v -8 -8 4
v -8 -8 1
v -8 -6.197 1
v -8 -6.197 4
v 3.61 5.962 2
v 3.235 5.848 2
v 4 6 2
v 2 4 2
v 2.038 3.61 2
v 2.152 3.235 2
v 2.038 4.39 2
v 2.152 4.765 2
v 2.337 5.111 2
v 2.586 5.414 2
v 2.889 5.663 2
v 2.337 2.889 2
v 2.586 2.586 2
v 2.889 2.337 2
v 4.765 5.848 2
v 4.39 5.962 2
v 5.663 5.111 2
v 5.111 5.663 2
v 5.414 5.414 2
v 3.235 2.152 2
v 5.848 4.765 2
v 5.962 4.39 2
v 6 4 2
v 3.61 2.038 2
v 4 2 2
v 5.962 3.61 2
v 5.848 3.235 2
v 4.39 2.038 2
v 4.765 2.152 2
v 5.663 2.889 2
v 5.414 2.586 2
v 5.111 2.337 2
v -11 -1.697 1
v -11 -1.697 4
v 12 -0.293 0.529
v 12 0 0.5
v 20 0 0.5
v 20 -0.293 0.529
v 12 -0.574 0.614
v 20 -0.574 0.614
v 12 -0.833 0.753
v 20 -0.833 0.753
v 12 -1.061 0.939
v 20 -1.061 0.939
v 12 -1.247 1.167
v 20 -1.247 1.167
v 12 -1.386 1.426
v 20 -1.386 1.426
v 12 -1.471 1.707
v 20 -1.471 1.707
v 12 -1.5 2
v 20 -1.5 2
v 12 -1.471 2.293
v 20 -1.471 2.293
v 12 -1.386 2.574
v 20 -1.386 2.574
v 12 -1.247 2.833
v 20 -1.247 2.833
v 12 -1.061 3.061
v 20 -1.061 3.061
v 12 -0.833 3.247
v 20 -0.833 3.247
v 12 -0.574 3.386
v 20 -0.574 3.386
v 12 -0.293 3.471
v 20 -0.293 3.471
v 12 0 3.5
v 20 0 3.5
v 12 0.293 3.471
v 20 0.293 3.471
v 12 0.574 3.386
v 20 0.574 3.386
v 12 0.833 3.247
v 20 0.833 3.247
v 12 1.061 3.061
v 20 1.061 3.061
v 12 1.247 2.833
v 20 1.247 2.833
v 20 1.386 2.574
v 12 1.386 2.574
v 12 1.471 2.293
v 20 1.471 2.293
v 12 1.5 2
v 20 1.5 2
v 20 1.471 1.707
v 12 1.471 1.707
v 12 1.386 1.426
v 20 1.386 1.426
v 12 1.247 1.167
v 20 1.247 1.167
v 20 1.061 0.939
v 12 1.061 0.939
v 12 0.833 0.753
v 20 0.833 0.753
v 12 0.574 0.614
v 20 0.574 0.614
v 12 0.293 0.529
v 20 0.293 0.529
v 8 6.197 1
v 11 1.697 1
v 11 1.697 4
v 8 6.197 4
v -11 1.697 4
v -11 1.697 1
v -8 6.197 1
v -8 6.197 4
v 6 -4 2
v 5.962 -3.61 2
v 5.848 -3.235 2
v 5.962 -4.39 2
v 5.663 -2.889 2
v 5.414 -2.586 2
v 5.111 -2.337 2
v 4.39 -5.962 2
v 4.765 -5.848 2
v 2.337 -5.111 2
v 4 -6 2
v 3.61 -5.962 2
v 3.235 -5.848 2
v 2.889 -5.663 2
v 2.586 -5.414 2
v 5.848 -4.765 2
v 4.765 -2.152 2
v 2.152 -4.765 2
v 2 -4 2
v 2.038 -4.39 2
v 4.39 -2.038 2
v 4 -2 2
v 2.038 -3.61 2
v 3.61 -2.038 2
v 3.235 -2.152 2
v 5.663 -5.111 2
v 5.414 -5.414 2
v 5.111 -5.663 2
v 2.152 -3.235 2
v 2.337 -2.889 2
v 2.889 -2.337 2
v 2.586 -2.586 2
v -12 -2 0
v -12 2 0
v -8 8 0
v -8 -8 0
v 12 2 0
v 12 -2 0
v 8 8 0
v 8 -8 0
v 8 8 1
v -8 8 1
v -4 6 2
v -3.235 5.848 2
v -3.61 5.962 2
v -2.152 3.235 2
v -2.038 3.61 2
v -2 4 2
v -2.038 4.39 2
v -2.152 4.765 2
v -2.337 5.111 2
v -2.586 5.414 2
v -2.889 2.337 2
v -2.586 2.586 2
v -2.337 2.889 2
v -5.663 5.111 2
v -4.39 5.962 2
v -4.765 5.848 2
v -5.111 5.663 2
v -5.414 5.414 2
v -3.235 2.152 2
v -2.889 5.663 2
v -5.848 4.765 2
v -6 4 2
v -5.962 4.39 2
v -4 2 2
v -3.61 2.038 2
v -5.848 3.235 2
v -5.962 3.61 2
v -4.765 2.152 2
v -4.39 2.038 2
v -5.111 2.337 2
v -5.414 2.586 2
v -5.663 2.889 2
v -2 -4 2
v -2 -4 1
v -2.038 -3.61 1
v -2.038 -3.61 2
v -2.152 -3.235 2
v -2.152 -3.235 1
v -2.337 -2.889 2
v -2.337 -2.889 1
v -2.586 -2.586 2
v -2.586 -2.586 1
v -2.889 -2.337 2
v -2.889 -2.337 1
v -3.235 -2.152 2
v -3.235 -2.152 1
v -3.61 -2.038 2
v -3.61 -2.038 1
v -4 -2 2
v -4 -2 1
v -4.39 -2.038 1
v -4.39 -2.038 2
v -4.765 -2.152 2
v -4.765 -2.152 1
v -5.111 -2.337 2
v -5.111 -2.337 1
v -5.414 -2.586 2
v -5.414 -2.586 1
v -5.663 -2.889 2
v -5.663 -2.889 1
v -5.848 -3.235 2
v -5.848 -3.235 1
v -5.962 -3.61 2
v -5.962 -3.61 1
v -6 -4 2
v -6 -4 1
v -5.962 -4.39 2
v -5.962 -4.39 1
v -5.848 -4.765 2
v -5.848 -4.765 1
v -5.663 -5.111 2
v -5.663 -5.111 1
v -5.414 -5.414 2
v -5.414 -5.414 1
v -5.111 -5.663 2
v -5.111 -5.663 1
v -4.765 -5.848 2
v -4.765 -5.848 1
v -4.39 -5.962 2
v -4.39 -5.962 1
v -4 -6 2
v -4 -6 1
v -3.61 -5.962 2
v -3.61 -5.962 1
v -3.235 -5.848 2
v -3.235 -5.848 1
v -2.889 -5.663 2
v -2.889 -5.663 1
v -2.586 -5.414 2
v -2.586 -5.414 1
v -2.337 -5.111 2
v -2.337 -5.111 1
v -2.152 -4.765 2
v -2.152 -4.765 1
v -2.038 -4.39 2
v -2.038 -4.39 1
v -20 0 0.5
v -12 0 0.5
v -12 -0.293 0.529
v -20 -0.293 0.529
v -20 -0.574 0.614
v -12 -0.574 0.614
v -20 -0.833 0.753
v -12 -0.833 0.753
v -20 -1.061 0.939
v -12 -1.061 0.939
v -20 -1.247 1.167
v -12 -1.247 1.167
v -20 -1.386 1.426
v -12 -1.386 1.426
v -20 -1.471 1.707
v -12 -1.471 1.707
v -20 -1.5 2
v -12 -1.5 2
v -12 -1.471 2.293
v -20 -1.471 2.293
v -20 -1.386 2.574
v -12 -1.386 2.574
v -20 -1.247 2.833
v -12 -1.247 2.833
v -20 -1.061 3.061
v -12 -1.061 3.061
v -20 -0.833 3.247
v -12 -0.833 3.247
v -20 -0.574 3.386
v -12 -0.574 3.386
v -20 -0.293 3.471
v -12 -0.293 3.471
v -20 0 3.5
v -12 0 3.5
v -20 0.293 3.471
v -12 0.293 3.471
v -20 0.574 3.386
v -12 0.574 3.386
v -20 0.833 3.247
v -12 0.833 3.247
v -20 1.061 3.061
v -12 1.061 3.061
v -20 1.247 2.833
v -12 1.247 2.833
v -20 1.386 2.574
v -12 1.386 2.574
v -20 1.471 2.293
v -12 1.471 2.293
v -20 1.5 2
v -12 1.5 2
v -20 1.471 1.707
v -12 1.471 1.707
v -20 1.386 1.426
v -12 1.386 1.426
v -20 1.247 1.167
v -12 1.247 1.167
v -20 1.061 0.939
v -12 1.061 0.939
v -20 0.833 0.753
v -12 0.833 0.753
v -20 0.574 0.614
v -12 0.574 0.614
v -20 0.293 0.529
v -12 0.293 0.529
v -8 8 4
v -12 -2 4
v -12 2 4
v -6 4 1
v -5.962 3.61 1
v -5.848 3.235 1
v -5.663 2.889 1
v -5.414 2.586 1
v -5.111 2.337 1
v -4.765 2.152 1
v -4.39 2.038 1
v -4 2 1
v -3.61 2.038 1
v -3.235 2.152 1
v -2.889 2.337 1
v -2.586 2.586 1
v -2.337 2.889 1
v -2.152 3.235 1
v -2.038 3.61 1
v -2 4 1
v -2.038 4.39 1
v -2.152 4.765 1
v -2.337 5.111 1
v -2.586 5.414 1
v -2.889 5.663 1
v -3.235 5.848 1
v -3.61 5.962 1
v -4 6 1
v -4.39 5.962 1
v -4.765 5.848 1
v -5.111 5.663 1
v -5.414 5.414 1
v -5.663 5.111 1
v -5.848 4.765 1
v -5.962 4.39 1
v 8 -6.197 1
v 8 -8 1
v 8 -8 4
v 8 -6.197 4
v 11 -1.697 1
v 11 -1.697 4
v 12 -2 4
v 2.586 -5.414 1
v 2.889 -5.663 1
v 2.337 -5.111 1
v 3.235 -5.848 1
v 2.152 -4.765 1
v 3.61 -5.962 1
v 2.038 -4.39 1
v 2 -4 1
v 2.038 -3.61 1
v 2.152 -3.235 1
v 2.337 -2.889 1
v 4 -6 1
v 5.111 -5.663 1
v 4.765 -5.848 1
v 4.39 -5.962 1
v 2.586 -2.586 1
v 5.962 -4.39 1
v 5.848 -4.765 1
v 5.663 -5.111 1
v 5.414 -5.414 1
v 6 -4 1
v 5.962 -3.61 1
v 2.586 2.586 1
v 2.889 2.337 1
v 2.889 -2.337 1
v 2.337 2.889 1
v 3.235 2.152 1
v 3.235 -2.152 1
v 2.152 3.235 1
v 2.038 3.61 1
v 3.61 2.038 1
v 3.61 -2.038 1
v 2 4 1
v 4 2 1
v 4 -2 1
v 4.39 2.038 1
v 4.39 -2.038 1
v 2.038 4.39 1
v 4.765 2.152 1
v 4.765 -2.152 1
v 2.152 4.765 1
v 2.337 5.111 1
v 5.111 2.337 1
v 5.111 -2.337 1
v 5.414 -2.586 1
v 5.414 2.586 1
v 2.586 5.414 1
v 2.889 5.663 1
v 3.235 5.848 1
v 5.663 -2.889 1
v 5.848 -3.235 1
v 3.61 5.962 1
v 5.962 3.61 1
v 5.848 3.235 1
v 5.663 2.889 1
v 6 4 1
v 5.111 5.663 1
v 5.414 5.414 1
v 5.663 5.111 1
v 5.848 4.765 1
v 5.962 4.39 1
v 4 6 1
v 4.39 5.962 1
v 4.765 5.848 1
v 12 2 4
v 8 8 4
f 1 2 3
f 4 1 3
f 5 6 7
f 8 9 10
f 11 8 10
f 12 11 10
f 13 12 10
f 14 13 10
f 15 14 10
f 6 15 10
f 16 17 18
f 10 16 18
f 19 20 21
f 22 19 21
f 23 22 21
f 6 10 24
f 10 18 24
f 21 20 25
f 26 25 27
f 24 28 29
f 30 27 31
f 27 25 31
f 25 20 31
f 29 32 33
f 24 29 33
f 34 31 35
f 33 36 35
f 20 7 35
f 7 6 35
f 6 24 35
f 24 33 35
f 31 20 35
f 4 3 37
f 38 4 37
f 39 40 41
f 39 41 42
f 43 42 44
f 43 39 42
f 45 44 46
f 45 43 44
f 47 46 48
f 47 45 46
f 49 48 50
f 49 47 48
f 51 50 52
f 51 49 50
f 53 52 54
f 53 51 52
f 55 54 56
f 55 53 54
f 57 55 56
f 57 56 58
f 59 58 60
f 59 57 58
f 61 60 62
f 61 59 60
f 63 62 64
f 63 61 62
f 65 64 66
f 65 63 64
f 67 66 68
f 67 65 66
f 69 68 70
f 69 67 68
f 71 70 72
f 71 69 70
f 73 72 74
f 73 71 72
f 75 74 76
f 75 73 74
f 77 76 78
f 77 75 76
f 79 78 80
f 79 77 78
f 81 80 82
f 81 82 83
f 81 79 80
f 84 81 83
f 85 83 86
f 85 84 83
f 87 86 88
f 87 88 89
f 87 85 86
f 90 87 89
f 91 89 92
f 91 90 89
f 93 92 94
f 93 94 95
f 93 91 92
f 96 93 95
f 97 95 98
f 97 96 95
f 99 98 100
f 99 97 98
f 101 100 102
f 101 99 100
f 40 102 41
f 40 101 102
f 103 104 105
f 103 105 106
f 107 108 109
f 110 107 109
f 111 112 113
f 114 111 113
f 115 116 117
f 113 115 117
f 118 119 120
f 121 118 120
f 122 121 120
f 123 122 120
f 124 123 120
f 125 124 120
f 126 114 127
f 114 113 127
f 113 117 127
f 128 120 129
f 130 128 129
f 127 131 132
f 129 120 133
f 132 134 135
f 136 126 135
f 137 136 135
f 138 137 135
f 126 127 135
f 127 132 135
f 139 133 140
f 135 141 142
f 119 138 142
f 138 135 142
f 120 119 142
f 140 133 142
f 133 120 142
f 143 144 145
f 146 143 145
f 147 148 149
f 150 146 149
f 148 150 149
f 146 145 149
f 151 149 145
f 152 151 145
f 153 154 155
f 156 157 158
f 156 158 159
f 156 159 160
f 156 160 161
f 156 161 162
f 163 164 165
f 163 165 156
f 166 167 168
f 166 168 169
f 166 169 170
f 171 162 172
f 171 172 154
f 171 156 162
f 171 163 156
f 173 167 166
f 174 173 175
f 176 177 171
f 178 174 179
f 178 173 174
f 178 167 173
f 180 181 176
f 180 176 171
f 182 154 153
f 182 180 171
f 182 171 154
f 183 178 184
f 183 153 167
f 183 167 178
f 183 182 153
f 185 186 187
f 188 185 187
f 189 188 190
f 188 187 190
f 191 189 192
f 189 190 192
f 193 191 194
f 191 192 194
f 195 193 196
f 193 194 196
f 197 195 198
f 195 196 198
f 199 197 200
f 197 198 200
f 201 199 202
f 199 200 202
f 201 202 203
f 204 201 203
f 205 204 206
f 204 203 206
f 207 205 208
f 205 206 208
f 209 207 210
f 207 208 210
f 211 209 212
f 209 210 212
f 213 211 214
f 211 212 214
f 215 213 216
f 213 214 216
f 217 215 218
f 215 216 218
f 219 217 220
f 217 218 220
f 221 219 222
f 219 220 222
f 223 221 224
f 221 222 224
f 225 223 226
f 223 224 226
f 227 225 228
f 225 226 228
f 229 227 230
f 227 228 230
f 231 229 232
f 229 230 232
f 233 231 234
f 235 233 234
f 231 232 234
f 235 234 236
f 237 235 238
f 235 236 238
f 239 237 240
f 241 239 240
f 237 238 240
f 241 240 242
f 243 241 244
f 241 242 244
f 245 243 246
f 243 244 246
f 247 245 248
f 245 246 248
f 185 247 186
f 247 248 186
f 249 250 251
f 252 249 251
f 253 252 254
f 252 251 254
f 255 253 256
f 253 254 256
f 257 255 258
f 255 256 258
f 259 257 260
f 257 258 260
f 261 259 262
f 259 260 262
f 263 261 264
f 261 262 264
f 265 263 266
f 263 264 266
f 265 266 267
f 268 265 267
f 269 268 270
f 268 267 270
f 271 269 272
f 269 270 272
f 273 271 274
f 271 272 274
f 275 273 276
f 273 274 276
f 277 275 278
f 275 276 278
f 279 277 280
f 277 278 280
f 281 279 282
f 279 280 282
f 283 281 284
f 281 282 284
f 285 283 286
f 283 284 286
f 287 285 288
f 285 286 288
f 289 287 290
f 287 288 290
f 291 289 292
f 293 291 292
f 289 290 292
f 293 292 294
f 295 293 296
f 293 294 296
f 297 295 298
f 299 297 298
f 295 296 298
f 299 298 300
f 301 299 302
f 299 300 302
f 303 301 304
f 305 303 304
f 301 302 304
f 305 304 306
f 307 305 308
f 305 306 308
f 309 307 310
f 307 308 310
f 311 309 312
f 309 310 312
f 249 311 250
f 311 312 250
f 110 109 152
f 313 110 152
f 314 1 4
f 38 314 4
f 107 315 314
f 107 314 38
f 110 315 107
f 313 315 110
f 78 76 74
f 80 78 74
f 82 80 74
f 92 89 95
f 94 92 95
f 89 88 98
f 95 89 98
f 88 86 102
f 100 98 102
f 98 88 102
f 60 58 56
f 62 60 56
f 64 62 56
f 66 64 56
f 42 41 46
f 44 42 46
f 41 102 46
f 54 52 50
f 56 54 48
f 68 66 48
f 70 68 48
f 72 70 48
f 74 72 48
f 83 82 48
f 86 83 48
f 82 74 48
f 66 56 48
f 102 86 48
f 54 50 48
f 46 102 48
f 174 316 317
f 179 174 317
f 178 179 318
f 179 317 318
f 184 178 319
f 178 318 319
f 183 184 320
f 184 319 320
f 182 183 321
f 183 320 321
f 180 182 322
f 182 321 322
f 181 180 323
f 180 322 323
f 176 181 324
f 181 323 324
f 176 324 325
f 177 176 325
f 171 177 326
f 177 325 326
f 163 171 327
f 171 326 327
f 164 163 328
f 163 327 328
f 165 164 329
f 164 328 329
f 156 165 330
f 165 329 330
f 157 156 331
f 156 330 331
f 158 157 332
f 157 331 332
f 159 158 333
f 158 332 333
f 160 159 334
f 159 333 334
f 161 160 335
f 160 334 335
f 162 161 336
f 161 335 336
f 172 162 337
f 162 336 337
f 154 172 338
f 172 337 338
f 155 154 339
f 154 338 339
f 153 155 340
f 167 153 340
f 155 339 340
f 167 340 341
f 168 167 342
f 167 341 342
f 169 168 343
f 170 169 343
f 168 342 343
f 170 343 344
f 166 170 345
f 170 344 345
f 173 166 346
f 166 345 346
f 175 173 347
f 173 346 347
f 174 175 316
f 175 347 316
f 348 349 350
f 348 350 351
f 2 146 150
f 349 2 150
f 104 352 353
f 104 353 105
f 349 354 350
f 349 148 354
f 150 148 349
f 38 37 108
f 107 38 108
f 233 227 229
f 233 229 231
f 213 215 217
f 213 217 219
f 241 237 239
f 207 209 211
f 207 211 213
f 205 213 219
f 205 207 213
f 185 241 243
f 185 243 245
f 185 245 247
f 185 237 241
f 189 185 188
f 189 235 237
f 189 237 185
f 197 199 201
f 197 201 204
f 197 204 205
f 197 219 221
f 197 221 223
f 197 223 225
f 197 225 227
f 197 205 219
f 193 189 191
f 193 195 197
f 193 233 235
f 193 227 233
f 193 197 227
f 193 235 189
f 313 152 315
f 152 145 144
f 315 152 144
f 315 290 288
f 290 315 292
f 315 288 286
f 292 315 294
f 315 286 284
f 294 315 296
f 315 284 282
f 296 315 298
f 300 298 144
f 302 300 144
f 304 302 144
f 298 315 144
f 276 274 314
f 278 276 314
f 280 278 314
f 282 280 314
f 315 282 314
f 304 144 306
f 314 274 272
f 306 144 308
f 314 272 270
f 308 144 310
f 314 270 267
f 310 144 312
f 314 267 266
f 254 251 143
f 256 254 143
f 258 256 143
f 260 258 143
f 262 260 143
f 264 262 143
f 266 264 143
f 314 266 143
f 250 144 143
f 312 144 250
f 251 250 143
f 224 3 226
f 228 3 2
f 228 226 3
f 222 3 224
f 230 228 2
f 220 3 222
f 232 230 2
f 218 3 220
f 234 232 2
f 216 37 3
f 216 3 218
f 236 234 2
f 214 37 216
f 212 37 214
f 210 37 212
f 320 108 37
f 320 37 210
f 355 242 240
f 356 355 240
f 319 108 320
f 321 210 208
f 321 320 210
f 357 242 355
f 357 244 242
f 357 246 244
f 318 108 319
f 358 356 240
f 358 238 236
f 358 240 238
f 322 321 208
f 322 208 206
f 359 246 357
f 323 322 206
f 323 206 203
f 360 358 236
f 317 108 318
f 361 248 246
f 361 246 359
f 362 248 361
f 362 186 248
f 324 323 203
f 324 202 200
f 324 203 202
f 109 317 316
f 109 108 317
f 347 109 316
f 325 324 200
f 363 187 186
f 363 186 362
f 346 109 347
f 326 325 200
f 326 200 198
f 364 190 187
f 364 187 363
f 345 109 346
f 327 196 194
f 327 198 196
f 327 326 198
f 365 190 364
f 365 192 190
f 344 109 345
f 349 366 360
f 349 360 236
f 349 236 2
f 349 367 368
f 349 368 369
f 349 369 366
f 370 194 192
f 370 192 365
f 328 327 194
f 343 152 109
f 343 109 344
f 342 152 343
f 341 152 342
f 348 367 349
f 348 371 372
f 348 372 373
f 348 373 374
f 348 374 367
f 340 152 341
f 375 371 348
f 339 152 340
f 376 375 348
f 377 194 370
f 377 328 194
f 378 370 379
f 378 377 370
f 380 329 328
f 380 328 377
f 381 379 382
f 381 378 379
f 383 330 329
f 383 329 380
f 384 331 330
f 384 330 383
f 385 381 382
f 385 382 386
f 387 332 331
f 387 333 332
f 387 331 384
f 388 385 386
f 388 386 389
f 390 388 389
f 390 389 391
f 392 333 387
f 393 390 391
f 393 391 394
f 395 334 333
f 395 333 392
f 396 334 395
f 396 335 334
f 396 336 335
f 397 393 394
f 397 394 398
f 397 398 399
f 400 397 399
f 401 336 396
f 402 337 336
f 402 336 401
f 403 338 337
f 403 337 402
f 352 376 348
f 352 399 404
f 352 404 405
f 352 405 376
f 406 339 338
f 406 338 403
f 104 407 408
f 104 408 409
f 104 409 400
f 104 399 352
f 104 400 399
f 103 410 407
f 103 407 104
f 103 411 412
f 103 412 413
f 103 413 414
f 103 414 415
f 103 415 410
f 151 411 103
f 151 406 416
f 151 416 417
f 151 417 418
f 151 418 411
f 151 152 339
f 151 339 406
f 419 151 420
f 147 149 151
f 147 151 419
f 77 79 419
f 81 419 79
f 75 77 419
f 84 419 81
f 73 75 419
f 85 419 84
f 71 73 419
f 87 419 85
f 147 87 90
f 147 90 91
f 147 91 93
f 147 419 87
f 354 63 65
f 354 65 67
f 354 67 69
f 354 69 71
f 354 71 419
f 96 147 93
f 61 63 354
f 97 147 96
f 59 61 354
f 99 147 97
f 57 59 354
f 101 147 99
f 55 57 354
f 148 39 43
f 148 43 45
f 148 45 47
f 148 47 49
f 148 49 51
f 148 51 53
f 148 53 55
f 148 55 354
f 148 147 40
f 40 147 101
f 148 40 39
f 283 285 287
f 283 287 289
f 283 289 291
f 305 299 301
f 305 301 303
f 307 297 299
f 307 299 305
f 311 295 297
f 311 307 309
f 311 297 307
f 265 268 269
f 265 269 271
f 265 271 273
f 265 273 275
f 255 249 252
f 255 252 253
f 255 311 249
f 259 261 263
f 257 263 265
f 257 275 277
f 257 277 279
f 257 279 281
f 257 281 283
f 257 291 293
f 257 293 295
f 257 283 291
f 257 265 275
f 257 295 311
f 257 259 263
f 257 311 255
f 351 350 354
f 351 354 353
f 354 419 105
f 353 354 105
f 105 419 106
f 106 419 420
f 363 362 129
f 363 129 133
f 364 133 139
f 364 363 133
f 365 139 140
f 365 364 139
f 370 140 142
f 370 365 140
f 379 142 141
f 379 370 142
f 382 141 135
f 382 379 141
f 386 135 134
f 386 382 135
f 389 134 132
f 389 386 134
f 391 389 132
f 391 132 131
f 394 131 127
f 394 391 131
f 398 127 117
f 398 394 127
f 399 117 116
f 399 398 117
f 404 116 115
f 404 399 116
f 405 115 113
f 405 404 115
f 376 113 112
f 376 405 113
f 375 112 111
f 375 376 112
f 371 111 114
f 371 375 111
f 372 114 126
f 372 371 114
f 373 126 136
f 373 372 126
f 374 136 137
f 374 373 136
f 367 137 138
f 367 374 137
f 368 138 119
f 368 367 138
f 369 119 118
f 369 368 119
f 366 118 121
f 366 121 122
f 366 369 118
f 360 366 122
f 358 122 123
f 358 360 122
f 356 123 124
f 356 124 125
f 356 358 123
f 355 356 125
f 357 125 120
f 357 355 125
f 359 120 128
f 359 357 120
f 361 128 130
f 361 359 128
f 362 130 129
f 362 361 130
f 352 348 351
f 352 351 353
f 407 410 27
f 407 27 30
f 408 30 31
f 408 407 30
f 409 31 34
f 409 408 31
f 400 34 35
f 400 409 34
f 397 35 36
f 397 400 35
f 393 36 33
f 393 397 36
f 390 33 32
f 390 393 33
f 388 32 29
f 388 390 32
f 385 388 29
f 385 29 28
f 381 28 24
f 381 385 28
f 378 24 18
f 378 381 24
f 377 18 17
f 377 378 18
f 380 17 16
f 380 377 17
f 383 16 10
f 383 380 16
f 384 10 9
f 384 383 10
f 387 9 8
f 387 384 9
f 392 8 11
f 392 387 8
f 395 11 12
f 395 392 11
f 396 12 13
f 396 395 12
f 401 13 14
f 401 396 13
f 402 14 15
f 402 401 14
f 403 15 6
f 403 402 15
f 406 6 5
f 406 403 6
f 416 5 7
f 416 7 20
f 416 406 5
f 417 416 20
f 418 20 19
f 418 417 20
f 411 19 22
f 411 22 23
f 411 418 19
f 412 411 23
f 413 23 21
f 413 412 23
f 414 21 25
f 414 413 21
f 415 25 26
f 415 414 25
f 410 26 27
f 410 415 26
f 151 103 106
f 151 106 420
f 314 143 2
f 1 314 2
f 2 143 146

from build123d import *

# Parameters (mm, degrees)
BOSS_EXTRUDE1_DEPTH = 1
SKETCH3_R           = 2
BOSS_EXTRUDE2_DEPTH = 1
BOSS_EXTRUDE3_DEPTH = 3
SKETCH5_R           = 1.5
BOSS_EXTRUDE6_DEPTH = 8


with BuildPart() as part:
    # Sketch2 → Boss-Extrude1 (new body)
    with BuildSketch(Plane.XY):
        Polygon((-12, -2), (-12, 2), (-8, 8), (0, 8), (0, -8), (-8, -8), align=None)
    boss_extrude1 = extrude(amount=BOSS_EXTRUDE1_DEPTH)

    # Sketch3 → Boss-Extrude2 (add)
    with BuildSketch(Plane.XY.offset(1)):
        with Locations((-4, -4)):
            Circle(SKETCH3_R)
        with Locations(Location((-4, 4, 0), (0, 0, 180))):
            Circle(SKETCH3_R)
    boss_extrude2 = extrude(amount=BOSS_EXTRUDE2_DEPTH)

    # Sketch4 → Boss-Extrude3 (add)
    with BuildSketch(Plane.XY.offset(1)):
        Polygon((-12, -2), (-8, -8), (-8, -6.197224362), (-11, -1.697224362), (-11, 1.697224362), (-8, 6.197224362), (-8, 8), (-12, 2), align=None)
    boss_extrude3 = extrude(amount=BOSS_EXTRUDE3_DEPTH)

    # Sketch5 → Boss-Extrude6 (add)
    with BuildSketch(Plane.ZY.offset(12)):
        with Locations(Location((2, 0, 0), (0, 0, 180))):
            Circle(SKETCH5_R)
    boss_extrude6 = extrude(amount=BOSS_EXTRUDE6_DEPTH)

    # Mirror3: Boss-Extrude1, Boss-Extrude2, Boss-Extrude3, Boss-Extrude6 across plane
    add(boss_extrude1.mirror(Plane(origin=(0, 0, 0), x_dir=(0, 0, 1), z_dir=(1, 0, 0))))
    add(boss_extrude2.mirror(Plane(origin=(0, 0, 0), x_dir=(0, 0, 1), z_dir=(1, 0, 0))))
    add(boss_extrude3.mirror(Plane(origin=(0, 0, 0), x_dir=(0, 0, 1), z_dir=(1, 0, 0))))
    add(boss_extrude6.mirror(Plane(origin=(0, 0, 0), x_dir=(0, 0, 1), z_dir=(1, 0, 0))))


solid = part.part
